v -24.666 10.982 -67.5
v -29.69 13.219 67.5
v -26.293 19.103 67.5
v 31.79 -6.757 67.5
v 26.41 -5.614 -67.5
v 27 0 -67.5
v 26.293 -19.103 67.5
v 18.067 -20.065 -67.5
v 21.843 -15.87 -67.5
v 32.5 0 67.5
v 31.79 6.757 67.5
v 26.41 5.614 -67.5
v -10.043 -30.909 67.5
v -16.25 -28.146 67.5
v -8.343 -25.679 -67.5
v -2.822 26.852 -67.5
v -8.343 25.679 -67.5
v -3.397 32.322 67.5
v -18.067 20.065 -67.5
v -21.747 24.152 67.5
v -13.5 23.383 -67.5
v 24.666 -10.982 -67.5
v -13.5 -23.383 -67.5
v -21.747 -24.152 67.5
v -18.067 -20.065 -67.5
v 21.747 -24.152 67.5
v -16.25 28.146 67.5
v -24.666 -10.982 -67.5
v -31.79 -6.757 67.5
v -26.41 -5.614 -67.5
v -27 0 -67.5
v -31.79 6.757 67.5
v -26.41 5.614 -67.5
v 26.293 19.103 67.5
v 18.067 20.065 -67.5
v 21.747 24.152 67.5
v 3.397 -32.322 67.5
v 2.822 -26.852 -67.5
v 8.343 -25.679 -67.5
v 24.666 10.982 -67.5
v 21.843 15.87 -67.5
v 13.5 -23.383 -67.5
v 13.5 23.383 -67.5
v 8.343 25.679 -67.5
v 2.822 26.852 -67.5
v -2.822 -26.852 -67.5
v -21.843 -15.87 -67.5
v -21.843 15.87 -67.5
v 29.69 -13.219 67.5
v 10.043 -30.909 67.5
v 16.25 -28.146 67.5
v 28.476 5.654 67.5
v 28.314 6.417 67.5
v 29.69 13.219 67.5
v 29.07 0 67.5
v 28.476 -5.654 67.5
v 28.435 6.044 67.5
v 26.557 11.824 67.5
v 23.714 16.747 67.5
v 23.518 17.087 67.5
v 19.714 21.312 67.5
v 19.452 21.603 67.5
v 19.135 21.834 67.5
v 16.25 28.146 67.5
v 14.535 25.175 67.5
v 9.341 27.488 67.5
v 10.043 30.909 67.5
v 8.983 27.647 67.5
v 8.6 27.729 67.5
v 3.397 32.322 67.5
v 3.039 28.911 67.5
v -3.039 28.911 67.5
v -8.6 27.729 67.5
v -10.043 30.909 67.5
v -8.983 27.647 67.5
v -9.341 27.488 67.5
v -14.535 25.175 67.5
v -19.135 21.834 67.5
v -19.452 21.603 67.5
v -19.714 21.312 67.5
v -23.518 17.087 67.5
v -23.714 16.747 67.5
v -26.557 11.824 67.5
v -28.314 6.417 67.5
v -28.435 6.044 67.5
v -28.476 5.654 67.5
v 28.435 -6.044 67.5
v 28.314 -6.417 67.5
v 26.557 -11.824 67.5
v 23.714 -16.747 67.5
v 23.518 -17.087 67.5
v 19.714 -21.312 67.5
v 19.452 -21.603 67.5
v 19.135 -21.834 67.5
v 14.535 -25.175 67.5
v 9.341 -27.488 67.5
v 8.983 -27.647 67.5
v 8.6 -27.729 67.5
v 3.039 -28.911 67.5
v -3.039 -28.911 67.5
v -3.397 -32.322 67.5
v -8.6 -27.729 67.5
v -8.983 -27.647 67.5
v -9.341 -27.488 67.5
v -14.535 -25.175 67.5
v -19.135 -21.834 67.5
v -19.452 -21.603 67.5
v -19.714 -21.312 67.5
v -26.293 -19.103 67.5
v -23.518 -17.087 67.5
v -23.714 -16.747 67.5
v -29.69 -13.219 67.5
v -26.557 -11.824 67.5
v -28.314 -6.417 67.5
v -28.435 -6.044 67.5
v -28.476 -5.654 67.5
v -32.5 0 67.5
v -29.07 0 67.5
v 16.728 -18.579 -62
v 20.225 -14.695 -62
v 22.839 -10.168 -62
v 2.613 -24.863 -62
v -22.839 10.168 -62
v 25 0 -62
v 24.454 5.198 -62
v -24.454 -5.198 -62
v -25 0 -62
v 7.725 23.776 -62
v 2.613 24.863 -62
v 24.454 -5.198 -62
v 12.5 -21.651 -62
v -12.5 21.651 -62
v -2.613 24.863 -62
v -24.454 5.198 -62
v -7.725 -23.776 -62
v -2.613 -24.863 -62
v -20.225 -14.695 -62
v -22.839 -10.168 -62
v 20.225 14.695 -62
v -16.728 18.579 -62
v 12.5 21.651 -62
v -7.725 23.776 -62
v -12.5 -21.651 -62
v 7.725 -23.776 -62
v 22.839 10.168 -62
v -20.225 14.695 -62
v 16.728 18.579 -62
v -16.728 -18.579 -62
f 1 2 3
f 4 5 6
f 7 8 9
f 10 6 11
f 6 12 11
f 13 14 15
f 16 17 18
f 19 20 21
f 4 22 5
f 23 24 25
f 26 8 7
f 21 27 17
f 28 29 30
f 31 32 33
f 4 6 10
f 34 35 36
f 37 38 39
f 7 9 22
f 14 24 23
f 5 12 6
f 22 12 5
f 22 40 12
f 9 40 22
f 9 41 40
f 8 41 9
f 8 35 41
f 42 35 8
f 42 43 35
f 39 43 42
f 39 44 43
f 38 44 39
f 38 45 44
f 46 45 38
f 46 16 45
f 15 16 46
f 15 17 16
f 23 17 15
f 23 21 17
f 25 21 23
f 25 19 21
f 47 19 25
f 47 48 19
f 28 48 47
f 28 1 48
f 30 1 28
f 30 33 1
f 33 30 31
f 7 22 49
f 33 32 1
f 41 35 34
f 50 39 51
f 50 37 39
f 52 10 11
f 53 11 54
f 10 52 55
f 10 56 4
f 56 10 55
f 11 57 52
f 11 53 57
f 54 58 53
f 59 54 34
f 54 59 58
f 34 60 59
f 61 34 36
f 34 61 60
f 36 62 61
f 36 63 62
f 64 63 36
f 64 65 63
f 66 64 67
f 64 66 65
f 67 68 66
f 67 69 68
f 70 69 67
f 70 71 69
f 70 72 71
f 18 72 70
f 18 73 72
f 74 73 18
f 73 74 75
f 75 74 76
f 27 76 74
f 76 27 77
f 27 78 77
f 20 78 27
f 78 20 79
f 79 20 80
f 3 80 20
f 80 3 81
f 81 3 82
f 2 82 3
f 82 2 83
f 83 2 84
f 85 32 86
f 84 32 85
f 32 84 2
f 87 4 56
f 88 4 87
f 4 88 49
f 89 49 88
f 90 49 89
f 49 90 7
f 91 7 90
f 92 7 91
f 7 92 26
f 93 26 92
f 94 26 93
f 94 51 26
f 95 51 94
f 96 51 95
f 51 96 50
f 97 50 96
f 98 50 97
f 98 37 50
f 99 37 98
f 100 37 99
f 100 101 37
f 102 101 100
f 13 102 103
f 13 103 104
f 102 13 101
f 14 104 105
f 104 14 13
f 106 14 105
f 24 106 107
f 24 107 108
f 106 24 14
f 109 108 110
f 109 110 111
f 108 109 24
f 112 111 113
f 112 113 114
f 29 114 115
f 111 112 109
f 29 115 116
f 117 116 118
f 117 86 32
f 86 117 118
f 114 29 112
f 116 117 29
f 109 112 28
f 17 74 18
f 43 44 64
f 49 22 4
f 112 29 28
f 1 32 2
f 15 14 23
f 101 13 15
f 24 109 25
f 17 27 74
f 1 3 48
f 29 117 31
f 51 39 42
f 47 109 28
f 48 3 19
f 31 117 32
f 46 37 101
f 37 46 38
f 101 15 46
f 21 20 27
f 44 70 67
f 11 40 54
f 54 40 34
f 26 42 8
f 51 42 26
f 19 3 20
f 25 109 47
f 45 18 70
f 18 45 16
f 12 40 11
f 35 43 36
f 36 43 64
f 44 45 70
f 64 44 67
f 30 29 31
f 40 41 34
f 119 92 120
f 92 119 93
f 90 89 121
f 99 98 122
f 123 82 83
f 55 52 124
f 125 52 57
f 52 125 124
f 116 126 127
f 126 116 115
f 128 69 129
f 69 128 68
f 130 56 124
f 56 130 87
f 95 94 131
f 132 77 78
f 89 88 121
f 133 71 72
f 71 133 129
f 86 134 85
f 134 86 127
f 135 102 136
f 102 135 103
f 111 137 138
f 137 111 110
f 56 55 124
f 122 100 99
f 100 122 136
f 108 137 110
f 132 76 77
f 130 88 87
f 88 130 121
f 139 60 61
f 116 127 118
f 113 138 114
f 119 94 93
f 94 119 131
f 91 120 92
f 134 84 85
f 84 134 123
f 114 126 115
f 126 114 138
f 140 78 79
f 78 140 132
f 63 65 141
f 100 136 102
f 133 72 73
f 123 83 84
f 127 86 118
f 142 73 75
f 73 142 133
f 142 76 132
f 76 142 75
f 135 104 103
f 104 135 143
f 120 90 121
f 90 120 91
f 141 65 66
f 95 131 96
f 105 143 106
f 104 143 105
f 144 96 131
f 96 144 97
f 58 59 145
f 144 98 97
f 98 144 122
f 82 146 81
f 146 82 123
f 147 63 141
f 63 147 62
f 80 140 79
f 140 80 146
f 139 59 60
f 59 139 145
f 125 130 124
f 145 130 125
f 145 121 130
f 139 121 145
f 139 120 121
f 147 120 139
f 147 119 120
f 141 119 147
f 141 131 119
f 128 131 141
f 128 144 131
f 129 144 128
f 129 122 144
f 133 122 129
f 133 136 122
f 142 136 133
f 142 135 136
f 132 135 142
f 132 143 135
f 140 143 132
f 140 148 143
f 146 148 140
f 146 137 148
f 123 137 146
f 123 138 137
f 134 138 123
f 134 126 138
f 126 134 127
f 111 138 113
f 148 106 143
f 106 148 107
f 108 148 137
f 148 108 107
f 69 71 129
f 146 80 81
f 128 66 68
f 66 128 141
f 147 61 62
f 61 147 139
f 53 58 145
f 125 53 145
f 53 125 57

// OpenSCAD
module glass(type) {
    if(type == 1){
        glass_1();
    }else{
        glass_2();
    }
}

module glass_1(){
    color([1.0, 1.0, 1.0, 0.7]){
        difference(){
            cylinder(135, 27, 32.5, true);
            translate([0, 0, 8]){
                cylinder(140, 25, 29.4, true);
            }
        }
    }
}

module glass_2(){
    color([1.0, 1.0, 1.0, 0.7]){
        difference(){
            cylinder(140, 32.75, 32.75, true);
            translate([0, 0, 8]){
                cylinder(140, 31.75, 31.75, true);
            }
        }
    }
}

glass(1);
